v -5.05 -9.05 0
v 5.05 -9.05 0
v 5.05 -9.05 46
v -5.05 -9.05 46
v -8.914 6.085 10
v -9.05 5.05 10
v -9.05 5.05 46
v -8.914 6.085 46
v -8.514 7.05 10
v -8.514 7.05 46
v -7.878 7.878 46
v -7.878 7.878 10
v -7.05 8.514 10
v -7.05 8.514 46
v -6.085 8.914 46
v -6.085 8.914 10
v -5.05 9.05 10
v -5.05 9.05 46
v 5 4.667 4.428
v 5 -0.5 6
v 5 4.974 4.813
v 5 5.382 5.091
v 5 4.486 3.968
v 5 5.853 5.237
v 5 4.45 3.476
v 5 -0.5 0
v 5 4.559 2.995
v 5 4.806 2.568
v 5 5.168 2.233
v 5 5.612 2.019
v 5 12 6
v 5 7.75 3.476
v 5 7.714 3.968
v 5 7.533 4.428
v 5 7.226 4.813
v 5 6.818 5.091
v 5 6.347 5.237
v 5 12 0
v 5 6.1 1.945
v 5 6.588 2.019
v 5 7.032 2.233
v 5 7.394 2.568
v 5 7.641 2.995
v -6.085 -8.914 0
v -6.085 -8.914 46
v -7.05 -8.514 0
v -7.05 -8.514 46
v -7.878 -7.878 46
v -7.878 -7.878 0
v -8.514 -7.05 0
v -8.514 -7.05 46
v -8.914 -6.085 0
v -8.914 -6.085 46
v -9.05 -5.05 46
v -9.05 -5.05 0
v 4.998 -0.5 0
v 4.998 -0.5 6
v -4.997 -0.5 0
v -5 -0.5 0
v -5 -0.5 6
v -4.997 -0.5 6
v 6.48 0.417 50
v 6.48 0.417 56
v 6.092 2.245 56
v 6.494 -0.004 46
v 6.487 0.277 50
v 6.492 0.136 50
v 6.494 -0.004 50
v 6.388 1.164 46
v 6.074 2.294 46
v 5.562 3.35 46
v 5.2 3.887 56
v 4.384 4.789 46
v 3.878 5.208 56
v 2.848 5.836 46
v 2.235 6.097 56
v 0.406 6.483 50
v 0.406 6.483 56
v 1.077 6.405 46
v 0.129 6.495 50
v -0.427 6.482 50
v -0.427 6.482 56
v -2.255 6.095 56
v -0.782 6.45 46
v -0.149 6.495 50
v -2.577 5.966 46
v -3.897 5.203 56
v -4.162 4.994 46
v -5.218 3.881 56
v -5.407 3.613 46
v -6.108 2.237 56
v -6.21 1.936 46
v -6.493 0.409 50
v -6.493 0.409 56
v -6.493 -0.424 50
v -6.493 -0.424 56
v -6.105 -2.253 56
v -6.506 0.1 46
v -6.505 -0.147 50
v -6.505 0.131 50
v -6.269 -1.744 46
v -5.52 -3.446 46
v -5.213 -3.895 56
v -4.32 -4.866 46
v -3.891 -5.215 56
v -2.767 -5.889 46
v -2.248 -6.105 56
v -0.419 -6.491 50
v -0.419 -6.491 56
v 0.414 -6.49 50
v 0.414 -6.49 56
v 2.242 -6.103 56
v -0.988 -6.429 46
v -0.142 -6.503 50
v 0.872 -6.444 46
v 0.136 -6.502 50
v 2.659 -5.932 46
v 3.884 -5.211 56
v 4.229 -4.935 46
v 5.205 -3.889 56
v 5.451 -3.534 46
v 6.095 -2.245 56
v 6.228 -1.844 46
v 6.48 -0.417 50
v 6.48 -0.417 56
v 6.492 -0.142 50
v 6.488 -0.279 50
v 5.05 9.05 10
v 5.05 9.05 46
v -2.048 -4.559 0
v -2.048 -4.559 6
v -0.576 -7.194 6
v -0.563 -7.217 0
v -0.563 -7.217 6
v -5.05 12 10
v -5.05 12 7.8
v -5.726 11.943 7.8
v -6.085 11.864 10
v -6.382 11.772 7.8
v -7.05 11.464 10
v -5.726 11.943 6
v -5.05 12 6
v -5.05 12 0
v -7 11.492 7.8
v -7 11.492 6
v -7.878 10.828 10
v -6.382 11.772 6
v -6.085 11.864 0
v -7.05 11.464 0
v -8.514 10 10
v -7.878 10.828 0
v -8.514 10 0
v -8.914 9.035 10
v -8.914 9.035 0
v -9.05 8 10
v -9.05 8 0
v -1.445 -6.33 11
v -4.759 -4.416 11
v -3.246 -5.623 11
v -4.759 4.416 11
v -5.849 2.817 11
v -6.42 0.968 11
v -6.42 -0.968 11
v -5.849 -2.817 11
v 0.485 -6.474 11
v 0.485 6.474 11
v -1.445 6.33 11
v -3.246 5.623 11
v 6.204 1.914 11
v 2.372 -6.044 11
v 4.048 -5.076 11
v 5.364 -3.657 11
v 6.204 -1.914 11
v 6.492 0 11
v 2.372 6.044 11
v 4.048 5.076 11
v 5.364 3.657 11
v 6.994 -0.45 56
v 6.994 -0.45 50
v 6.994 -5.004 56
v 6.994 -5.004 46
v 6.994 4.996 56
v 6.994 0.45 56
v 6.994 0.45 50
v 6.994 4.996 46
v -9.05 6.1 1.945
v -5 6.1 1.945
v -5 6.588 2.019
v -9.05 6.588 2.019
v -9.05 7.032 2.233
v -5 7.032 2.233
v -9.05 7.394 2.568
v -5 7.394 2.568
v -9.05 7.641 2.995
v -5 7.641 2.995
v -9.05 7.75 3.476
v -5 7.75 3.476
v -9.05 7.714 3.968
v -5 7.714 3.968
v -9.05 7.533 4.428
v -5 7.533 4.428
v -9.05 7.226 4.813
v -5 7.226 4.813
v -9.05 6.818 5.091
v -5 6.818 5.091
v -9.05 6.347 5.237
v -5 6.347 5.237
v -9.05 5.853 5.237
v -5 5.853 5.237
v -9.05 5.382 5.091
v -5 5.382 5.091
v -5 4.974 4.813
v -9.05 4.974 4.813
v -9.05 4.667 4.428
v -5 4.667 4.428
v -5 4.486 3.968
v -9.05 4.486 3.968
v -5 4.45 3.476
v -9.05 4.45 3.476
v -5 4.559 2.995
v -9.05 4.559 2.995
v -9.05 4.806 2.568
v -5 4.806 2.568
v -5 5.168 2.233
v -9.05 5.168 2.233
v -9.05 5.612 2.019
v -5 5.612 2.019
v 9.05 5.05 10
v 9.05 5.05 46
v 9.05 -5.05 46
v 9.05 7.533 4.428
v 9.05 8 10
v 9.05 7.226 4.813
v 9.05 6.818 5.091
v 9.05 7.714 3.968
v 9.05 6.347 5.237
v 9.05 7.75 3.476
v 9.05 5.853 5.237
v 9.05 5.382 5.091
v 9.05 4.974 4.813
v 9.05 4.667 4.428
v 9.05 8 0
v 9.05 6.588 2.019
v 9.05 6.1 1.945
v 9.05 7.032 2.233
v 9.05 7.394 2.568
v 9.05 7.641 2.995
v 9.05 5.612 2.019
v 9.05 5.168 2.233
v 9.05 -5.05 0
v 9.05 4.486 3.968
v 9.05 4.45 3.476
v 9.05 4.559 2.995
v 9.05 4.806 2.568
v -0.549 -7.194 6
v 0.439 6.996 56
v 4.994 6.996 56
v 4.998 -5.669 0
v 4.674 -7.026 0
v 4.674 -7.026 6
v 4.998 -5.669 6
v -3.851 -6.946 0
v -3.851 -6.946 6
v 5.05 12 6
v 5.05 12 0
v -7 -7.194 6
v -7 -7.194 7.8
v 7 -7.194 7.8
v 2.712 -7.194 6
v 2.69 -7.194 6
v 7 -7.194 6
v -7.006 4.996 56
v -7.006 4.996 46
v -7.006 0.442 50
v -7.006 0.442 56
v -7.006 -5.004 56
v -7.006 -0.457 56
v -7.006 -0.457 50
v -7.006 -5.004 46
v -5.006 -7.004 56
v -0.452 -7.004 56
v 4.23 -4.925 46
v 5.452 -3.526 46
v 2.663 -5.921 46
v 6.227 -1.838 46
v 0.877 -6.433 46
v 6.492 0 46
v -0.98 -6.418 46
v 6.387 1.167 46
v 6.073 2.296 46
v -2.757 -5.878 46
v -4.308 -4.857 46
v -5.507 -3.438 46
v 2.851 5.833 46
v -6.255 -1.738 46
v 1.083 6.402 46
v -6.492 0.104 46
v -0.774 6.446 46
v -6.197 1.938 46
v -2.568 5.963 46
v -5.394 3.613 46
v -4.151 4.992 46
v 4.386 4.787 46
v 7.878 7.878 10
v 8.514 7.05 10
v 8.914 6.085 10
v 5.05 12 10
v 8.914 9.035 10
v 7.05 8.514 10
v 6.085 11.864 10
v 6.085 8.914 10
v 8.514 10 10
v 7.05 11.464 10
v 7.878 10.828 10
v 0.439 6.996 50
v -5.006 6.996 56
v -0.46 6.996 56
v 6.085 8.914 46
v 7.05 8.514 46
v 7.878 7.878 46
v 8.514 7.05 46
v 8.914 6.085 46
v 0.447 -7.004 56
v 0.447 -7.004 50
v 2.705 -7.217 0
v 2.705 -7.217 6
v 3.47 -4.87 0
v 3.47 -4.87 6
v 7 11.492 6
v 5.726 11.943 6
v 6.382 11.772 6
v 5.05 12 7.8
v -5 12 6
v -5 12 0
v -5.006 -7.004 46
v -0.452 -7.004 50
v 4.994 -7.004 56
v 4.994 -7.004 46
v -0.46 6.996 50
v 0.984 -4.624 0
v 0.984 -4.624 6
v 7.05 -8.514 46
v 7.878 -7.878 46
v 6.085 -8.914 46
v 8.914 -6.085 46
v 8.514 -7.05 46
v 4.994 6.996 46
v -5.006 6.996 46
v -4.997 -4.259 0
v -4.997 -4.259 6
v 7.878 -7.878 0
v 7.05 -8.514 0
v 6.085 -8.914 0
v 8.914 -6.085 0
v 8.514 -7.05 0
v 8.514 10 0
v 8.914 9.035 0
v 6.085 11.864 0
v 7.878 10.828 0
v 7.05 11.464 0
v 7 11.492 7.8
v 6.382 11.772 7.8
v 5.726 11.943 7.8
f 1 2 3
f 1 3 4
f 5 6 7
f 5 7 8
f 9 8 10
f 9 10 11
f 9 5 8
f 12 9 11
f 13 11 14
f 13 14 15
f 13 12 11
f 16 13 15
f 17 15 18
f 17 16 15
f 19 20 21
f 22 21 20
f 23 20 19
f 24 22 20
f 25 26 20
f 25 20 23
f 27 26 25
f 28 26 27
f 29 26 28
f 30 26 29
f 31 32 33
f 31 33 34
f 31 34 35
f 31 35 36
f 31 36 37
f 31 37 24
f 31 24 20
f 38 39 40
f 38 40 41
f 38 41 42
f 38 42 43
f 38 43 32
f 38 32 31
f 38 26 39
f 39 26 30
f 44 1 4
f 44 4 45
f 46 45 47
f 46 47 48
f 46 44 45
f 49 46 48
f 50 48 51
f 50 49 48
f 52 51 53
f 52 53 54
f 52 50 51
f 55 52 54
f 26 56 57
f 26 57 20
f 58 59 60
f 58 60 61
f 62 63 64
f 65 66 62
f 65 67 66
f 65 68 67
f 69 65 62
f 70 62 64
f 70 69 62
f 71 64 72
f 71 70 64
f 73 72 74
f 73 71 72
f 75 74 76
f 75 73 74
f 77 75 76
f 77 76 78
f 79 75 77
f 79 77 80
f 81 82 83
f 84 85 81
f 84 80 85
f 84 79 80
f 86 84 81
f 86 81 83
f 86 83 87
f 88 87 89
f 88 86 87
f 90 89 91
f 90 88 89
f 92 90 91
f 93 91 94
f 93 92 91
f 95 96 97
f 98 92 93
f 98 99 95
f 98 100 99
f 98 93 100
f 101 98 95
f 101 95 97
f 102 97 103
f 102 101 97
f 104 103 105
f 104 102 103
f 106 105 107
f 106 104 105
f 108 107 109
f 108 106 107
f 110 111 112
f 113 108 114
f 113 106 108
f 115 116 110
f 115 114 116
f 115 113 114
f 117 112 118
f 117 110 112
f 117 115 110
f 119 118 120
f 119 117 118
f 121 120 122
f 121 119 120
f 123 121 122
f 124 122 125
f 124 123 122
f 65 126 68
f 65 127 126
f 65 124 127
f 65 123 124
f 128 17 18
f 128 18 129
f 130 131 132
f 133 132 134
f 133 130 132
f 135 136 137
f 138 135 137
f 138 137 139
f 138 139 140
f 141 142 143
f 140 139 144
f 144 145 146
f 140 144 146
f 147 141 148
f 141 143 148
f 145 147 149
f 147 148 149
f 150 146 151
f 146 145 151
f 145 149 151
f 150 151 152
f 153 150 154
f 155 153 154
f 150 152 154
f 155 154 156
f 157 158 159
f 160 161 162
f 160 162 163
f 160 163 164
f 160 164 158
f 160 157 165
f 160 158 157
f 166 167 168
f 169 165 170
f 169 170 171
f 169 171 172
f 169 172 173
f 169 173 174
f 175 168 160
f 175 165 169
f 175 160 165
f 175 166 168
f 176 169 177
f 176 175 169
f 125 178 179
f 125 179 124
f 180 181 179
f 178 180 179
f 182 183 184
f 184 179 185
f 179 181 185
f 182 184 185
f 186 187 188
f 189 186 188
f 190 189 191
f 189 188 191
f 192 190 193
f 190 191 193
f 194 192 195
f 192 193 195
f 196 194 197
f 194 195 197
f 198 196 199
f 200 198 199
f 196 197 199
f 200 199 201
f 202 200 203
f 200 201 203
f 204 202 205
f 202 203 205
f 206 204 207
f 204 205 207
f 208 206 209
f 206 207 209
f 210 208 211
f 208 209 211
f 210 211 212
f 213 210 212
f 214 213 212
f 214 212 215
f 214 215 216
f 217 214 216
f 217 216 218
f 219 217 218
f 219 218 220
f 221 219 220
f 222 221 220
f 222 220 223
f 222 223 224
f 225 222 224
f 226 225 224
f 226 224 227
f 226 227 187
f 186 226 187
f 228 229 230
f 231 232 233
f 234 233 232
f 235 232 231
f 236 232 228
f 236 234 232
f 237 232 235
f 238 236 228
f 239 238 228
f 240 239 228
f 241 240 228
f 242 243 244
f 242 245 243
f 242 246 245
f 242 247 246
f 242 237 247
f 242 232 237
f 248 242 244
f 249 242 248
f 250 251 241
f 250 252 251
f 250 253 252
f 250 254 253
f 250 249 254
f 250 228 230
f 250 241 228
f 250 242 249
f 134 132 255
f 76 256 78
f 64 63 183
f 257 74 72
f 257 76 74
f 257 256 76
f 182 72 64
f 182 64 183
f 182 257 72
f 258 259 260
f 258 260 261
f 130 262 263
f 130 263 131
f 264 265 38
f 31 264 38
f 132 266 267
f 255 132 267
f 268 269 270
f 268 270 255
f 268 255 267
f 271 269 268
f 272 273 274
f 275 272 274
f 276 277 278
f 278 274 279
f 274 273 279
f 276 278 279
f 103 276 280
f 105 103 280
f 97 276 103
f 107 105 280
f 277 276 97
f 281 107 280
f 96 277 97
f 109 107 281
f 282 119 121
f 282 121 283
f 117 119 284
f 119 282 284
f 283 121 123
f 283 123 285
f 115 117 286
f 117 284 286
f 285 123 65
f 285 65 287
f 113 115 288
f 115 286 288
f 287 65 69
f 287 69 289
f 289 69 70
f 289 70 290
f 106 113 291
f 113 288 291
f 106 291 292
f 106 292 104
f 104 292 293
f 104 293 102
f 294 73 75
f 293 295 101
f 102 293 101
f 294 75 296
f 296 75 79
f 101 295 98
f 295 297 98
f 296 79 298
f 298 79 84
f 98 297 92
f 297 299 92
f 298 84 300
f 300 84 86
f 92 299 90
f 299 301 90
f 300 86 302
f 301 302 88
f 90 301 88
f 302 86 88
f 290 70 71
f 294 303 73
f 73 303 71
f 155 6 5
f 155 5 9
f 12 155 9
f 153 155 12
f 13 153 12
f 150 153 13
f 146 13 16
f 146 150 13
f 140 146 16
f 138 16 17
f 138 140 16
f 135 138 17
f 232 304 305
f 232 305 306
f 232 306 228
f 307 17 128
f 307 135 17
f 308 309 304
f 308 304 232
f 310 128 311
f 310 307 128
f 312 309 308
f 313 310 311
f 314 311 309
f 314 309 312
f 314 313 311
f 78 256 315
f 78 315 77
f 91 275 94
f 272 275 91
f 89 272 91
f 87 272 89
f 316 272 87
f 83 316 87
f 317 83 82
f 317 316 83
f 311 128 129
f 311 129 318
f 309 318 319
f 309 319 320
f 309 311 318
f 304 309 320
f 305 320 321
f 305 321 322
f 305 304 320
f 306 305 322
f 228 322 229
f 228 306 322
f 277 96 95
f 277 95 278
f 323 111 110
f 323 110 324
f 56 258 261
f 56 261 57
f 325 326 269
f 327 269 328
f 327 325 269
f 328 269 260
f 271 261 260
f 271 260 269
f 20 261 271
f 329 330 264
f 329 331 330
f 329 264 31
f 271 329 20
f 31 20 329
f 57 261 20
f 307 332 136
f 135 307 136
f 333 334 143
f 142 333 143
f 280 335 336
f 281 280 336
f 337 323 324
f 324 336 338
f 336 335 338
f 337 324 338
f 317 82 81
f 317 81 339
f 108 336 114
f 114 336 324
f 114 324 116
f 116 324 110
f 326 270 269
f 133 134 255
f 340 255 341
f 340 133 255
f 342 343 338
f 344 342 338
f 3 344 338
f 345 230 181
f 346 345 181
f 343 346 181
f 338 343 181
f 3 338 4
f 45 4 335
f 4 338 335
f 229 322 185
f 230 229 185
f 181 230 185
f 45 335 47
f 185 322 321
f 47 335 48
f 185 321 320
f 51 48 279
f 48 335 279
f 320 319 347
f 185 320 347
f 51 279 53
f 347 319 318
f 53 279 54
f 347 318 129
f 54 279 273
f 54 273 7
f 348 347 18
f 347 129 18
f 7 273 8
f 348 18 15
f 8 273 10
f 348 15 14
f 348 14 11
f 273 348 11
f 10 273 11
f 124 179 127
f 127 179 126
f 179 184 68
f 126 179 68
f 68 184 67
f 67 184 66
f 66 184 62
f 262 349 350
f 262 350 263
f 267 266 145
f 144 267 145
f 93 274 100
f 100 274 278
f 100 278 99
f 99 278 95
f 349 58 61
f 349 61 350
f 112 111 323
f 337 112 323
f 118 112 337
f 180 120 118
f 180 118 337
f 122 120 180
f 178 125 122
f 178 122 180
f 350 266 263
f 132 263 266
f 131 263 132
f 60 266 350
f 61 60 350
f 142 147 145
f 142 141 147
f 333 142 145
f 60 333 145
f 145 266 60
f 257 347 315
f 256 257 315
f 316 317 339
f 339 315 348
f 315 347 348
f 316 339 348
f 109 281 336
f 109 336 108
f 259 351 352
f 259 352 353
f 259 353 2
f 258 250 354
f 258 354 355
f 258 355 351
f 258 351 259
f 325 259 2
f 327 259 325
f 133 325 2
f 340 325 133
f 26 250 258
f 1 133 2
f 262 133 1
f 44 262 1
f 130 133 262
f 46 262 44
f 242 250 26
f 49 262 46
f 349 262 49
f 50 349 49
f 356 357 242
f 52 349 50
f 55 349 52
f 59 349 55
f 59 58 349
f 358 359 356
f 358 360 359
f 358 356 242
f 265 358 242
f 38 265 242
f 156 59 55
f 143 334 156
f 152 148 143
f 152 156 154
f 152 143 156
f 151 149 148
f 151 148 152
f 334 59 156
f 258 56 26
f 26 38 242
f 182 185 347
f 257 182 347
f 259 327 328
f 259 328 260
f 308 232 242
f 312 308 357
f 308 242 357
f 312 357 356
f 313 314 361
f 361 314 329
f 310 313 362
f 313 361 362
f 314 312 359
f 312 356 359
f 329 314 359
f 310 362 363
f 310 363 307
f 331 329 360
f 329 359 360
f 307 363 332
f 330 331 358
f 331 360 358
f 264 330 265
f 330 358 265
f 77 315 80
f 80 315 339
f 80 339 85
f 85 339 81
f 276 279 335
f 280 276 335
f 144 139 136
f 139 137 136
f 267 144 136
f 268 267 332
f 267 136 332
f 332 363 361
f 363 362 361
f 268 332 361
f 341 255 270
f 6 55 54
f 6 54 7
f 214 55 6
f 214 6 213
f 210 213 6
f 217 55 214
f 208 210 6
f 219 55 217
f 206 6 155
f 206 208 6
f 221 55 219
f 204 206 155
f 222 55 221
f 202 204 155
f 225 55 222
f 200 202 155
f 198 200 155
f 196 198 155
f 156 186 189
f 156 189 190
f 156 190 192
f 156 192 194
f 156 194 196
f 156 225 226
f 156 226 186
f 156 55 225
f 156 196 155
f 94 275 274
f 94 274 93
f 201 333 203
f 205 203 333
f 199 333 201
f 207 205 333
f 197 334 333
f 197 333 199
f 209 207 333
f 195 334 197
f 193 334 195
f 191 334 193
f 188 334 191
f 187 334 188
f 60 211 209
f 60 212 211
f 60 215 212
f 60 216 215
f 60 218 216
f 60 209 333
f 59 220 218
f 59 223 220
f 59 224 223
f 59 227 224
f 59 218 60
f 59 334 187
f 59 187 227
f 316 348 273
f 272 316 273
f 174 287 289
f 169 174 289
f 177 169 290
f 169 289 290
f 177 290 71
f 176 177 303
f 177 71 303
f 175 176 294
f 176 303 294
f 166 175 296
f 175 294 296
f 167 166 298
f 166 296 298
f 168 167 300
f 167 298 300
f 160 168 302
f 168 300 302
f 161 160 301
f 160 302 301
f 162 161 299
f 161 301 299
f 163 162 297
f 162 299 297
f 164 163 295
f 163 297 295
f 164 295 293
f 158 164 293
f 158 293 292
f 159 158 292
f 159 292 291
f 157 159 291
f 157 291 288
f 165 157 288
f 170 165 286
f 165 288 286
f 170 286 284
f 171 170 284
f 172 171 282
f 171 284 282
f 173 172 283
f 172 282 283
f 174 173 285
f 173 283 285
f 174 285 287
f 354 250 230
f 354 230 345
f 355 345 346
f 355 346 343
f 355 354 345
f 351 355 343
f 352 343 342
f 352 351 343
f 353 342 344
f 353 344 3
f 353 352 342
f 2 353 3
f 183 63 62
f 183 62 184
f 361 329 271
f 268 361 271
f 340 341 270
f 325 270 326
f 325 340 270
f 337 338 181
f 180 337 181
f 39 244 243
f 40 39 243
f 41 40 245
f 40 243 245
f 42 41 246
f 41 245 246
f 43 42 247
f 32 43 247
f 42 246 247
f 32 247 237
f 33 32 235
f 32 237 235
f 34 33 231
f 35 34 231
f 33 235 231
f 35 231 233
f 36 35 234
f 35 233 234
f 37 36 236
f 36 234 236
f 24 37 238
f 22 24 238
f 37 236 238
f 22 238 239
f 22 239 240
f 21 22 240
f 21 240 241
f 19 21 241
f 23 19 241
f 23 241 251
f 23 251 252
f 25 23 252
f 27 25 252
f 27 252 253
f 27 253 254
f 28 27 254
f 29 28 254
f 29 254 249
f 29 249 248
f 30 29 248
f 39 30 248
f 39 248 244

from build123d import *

# Parameters (mm, degrees)
BOSS_EXTRUDE1_DEPTH = 46
BOSS_EXTRUDE3_DEPTH = 10
SKETCH17_R          = 1.655
CUT_EXTRUDE10_DEPTH = 30
CUT_EXTRUDE11_DEPTH = 6
CUT_EXTRUDE12_DEPTH = 1.8
CUT_EXTRUDE13_DEPTH = 7.2
SKETCH22_R          = 6.5
BOSS_EXTRUDE4_DEPTH = 10
CUT_EXTRUDE14_DEPTH = 6
CIRPATTERN1_COUNT   = 4
SKETCH24_R          = 6.492418411
CUT_EXTRUDE15_DEPTH = 35


with BuildPart() as part:
    # Sketch1 → Boss-Extrude1 (new body)
    with BuildSketch(Plane.XY):
        with BuildLine():
            Line((-5.05, 9.05), (5.05, 9.05))
            ThreePointArc((5.05, 9.05), (7.878427125, 7.878427125), (9.05, 5.05))
            Line((9.05, 5.05), (9.05, -5.05))
            ThreePointArc((9.05, -5.05), (7.878427125, -7.878427125), (5.05, -9.05))
            Line((5.05, -9.05), (-5.05, -9.05))
            ThreePointArc((-5.05, -9.05), (-7.878427125, -7.878427125), (-9.05, -5.05))
            Line((-9.05, -5.05), (-9.05, 5.05))
            ThreePointArc((-9.05, 5.05), (-7.878427125, 7.878427125), (-5.05, 9.05))
        make_face()
    extrude(amount=BOSS_EXTRUDE1_DEPTH)

    # Sketch15 → Boss-Extrude3 (add)
    with BuildSketch(Plane.XY):
        with BuildLine():
            Line((-5.05, -9.05), (5.05, -9.05))
            ThreePointArc((5.05, -9.05), (7.878427125, -7.878427125), (9.05, -5.05))
            Line((9.05, -5.05), (9.05, 8))
            ThreePointArc((9.05, 8), (7.878427125, 10.828427125), (5.05, 12))
            Line((5.05, 12), (-5.05, 12))
            ThreePointArc((-5.05, 12), (-7.878427125, 10.828427125), (-9.05, 8))
            Line((-9.05, 8), (-9.05, -5.05))
            ThreePointArc((-9.05, -5.05), (-7.878427125, -7.878427125), (-5.05, -9.05))
        make_face()
    extrude(amount=BOSS_EXTRUDE3_DEPTH)

    # Sketch17 → Cut-Extrude10 (cut)
    with BuildSketch(Plane(origin=(9.05, 0, 0), x_dir=(0, 0, -1), z_dir=(1, 0, 0))):
        with Locations((-3.6, 6.1)):
            Circle(SKETCH17_R)
    extrude(amount=-CUT_EXTRUDE10_DEPTH, mode=Mode.SUBTRACT)

    # Sketch18 → Cut-Extrude11 (cut)
    with BuildSketch(Plane.XY):
        Polygon((-4.996539756, -4.259182236), (-3.851088562, -6.946129507), (-2.048481088, -4.559068161), (-0.563070773, -7.21717083), (0.983895836, -4.624244345), (2.704822485, -7.21717083), (3.469678774, -4.870091009), (4.674482161, -7.026054964), (4.998172504, -5.668676456), (4.998172504, 5.373520003), (-4.996539756, 5.373520003), align=None)
    extrude(amount=CUT_EXTRUDE11_DEPTH, mode=Mode.SUBTRACT)

    # Sketch20 → Cut-Extrude12 (cut)
    with BuildSketch(Plane(origin=(0, 0, 6), x_dir=(-1, 0, 0), z_dir=(0, 0, -1))):
        Polygon((-7, 0), (-7, 13.473809321), (7, 13.473809321), (7, 0), (7, -7.194424303), (-7, -7.194424303), align=None)
    extrude(amount=-CUT_EXTRUDE12_DEPTH, mode=Mode.SUBTRACT)

    # Sketch21 → Cut-Extrude13 (cut)
    with BuildSketch(Plane.XY):
        Polygon((5, 17.493725323), (-5, 17.493725323), (-5, 0), (-5, -0.5), (5, -0.5), (5, 0), align=None)
    extrude(amount=CUT_EXTRUDE13_DEPTH, mode=Mode.SUBTRACT)

    # Sketch22 → Boss-Extrude4 (add)
    with BuildSketch(Plane.XY.offset(46)):
        Polygon((-5.006494522, -7.003911735), (4.993505478, -7.003911735), (6.993505478, -5.003911735), (6.993505478, 4.996088265), (4.993505478, 6.996088265), (-5.006494522, 6.996088265), (-7.006494522, 4.996088265), (-7.006494522, -5.003911735), align=None)
        with Locations((-0.006494522, -0.003911735)):
            Circle(SKETCH22_R, mode=Mode.SUBTRACT)
    extrude(amount=BOSS_EXTRUDE4_DEPTH)

    # Sketch23 → Cut-Extrude14 (cut)
    with BuildSketch(Plane.XY.offset(56)):
        Polygon((0, 0), (7, 0.45), (7, -0.45), align=None)
    cut_extrude14 = extrude(amount=-CUT_EXTRUDE14_DEPTH, mode=Mode.SUBTRACT)

    # CirPattern1: Cut-Extrude14 ×4 about axis
    cirpattern1_axis = Axis((-0.006494522, -0.003911735, 0), (0, 0, 1))
    for i in range(1, CIRPATTERN1_COUNT):
        add(cut_extrude14.rotate(cirpattern1_axis, i * 360 / CIRPATTERN1_COUNT), mode=Mode.SUBTRACT)

    # Sketch24 → Cut-Extrude15 (cut)
    with BuildSketch(Plane.XY.offset(46)):
        Circle(SKETCH24_R)
    extrude(amount=-CUT_EXTRUDE15_DEPTH, mode=Mode.SUBTRACT)


solid = part.part
